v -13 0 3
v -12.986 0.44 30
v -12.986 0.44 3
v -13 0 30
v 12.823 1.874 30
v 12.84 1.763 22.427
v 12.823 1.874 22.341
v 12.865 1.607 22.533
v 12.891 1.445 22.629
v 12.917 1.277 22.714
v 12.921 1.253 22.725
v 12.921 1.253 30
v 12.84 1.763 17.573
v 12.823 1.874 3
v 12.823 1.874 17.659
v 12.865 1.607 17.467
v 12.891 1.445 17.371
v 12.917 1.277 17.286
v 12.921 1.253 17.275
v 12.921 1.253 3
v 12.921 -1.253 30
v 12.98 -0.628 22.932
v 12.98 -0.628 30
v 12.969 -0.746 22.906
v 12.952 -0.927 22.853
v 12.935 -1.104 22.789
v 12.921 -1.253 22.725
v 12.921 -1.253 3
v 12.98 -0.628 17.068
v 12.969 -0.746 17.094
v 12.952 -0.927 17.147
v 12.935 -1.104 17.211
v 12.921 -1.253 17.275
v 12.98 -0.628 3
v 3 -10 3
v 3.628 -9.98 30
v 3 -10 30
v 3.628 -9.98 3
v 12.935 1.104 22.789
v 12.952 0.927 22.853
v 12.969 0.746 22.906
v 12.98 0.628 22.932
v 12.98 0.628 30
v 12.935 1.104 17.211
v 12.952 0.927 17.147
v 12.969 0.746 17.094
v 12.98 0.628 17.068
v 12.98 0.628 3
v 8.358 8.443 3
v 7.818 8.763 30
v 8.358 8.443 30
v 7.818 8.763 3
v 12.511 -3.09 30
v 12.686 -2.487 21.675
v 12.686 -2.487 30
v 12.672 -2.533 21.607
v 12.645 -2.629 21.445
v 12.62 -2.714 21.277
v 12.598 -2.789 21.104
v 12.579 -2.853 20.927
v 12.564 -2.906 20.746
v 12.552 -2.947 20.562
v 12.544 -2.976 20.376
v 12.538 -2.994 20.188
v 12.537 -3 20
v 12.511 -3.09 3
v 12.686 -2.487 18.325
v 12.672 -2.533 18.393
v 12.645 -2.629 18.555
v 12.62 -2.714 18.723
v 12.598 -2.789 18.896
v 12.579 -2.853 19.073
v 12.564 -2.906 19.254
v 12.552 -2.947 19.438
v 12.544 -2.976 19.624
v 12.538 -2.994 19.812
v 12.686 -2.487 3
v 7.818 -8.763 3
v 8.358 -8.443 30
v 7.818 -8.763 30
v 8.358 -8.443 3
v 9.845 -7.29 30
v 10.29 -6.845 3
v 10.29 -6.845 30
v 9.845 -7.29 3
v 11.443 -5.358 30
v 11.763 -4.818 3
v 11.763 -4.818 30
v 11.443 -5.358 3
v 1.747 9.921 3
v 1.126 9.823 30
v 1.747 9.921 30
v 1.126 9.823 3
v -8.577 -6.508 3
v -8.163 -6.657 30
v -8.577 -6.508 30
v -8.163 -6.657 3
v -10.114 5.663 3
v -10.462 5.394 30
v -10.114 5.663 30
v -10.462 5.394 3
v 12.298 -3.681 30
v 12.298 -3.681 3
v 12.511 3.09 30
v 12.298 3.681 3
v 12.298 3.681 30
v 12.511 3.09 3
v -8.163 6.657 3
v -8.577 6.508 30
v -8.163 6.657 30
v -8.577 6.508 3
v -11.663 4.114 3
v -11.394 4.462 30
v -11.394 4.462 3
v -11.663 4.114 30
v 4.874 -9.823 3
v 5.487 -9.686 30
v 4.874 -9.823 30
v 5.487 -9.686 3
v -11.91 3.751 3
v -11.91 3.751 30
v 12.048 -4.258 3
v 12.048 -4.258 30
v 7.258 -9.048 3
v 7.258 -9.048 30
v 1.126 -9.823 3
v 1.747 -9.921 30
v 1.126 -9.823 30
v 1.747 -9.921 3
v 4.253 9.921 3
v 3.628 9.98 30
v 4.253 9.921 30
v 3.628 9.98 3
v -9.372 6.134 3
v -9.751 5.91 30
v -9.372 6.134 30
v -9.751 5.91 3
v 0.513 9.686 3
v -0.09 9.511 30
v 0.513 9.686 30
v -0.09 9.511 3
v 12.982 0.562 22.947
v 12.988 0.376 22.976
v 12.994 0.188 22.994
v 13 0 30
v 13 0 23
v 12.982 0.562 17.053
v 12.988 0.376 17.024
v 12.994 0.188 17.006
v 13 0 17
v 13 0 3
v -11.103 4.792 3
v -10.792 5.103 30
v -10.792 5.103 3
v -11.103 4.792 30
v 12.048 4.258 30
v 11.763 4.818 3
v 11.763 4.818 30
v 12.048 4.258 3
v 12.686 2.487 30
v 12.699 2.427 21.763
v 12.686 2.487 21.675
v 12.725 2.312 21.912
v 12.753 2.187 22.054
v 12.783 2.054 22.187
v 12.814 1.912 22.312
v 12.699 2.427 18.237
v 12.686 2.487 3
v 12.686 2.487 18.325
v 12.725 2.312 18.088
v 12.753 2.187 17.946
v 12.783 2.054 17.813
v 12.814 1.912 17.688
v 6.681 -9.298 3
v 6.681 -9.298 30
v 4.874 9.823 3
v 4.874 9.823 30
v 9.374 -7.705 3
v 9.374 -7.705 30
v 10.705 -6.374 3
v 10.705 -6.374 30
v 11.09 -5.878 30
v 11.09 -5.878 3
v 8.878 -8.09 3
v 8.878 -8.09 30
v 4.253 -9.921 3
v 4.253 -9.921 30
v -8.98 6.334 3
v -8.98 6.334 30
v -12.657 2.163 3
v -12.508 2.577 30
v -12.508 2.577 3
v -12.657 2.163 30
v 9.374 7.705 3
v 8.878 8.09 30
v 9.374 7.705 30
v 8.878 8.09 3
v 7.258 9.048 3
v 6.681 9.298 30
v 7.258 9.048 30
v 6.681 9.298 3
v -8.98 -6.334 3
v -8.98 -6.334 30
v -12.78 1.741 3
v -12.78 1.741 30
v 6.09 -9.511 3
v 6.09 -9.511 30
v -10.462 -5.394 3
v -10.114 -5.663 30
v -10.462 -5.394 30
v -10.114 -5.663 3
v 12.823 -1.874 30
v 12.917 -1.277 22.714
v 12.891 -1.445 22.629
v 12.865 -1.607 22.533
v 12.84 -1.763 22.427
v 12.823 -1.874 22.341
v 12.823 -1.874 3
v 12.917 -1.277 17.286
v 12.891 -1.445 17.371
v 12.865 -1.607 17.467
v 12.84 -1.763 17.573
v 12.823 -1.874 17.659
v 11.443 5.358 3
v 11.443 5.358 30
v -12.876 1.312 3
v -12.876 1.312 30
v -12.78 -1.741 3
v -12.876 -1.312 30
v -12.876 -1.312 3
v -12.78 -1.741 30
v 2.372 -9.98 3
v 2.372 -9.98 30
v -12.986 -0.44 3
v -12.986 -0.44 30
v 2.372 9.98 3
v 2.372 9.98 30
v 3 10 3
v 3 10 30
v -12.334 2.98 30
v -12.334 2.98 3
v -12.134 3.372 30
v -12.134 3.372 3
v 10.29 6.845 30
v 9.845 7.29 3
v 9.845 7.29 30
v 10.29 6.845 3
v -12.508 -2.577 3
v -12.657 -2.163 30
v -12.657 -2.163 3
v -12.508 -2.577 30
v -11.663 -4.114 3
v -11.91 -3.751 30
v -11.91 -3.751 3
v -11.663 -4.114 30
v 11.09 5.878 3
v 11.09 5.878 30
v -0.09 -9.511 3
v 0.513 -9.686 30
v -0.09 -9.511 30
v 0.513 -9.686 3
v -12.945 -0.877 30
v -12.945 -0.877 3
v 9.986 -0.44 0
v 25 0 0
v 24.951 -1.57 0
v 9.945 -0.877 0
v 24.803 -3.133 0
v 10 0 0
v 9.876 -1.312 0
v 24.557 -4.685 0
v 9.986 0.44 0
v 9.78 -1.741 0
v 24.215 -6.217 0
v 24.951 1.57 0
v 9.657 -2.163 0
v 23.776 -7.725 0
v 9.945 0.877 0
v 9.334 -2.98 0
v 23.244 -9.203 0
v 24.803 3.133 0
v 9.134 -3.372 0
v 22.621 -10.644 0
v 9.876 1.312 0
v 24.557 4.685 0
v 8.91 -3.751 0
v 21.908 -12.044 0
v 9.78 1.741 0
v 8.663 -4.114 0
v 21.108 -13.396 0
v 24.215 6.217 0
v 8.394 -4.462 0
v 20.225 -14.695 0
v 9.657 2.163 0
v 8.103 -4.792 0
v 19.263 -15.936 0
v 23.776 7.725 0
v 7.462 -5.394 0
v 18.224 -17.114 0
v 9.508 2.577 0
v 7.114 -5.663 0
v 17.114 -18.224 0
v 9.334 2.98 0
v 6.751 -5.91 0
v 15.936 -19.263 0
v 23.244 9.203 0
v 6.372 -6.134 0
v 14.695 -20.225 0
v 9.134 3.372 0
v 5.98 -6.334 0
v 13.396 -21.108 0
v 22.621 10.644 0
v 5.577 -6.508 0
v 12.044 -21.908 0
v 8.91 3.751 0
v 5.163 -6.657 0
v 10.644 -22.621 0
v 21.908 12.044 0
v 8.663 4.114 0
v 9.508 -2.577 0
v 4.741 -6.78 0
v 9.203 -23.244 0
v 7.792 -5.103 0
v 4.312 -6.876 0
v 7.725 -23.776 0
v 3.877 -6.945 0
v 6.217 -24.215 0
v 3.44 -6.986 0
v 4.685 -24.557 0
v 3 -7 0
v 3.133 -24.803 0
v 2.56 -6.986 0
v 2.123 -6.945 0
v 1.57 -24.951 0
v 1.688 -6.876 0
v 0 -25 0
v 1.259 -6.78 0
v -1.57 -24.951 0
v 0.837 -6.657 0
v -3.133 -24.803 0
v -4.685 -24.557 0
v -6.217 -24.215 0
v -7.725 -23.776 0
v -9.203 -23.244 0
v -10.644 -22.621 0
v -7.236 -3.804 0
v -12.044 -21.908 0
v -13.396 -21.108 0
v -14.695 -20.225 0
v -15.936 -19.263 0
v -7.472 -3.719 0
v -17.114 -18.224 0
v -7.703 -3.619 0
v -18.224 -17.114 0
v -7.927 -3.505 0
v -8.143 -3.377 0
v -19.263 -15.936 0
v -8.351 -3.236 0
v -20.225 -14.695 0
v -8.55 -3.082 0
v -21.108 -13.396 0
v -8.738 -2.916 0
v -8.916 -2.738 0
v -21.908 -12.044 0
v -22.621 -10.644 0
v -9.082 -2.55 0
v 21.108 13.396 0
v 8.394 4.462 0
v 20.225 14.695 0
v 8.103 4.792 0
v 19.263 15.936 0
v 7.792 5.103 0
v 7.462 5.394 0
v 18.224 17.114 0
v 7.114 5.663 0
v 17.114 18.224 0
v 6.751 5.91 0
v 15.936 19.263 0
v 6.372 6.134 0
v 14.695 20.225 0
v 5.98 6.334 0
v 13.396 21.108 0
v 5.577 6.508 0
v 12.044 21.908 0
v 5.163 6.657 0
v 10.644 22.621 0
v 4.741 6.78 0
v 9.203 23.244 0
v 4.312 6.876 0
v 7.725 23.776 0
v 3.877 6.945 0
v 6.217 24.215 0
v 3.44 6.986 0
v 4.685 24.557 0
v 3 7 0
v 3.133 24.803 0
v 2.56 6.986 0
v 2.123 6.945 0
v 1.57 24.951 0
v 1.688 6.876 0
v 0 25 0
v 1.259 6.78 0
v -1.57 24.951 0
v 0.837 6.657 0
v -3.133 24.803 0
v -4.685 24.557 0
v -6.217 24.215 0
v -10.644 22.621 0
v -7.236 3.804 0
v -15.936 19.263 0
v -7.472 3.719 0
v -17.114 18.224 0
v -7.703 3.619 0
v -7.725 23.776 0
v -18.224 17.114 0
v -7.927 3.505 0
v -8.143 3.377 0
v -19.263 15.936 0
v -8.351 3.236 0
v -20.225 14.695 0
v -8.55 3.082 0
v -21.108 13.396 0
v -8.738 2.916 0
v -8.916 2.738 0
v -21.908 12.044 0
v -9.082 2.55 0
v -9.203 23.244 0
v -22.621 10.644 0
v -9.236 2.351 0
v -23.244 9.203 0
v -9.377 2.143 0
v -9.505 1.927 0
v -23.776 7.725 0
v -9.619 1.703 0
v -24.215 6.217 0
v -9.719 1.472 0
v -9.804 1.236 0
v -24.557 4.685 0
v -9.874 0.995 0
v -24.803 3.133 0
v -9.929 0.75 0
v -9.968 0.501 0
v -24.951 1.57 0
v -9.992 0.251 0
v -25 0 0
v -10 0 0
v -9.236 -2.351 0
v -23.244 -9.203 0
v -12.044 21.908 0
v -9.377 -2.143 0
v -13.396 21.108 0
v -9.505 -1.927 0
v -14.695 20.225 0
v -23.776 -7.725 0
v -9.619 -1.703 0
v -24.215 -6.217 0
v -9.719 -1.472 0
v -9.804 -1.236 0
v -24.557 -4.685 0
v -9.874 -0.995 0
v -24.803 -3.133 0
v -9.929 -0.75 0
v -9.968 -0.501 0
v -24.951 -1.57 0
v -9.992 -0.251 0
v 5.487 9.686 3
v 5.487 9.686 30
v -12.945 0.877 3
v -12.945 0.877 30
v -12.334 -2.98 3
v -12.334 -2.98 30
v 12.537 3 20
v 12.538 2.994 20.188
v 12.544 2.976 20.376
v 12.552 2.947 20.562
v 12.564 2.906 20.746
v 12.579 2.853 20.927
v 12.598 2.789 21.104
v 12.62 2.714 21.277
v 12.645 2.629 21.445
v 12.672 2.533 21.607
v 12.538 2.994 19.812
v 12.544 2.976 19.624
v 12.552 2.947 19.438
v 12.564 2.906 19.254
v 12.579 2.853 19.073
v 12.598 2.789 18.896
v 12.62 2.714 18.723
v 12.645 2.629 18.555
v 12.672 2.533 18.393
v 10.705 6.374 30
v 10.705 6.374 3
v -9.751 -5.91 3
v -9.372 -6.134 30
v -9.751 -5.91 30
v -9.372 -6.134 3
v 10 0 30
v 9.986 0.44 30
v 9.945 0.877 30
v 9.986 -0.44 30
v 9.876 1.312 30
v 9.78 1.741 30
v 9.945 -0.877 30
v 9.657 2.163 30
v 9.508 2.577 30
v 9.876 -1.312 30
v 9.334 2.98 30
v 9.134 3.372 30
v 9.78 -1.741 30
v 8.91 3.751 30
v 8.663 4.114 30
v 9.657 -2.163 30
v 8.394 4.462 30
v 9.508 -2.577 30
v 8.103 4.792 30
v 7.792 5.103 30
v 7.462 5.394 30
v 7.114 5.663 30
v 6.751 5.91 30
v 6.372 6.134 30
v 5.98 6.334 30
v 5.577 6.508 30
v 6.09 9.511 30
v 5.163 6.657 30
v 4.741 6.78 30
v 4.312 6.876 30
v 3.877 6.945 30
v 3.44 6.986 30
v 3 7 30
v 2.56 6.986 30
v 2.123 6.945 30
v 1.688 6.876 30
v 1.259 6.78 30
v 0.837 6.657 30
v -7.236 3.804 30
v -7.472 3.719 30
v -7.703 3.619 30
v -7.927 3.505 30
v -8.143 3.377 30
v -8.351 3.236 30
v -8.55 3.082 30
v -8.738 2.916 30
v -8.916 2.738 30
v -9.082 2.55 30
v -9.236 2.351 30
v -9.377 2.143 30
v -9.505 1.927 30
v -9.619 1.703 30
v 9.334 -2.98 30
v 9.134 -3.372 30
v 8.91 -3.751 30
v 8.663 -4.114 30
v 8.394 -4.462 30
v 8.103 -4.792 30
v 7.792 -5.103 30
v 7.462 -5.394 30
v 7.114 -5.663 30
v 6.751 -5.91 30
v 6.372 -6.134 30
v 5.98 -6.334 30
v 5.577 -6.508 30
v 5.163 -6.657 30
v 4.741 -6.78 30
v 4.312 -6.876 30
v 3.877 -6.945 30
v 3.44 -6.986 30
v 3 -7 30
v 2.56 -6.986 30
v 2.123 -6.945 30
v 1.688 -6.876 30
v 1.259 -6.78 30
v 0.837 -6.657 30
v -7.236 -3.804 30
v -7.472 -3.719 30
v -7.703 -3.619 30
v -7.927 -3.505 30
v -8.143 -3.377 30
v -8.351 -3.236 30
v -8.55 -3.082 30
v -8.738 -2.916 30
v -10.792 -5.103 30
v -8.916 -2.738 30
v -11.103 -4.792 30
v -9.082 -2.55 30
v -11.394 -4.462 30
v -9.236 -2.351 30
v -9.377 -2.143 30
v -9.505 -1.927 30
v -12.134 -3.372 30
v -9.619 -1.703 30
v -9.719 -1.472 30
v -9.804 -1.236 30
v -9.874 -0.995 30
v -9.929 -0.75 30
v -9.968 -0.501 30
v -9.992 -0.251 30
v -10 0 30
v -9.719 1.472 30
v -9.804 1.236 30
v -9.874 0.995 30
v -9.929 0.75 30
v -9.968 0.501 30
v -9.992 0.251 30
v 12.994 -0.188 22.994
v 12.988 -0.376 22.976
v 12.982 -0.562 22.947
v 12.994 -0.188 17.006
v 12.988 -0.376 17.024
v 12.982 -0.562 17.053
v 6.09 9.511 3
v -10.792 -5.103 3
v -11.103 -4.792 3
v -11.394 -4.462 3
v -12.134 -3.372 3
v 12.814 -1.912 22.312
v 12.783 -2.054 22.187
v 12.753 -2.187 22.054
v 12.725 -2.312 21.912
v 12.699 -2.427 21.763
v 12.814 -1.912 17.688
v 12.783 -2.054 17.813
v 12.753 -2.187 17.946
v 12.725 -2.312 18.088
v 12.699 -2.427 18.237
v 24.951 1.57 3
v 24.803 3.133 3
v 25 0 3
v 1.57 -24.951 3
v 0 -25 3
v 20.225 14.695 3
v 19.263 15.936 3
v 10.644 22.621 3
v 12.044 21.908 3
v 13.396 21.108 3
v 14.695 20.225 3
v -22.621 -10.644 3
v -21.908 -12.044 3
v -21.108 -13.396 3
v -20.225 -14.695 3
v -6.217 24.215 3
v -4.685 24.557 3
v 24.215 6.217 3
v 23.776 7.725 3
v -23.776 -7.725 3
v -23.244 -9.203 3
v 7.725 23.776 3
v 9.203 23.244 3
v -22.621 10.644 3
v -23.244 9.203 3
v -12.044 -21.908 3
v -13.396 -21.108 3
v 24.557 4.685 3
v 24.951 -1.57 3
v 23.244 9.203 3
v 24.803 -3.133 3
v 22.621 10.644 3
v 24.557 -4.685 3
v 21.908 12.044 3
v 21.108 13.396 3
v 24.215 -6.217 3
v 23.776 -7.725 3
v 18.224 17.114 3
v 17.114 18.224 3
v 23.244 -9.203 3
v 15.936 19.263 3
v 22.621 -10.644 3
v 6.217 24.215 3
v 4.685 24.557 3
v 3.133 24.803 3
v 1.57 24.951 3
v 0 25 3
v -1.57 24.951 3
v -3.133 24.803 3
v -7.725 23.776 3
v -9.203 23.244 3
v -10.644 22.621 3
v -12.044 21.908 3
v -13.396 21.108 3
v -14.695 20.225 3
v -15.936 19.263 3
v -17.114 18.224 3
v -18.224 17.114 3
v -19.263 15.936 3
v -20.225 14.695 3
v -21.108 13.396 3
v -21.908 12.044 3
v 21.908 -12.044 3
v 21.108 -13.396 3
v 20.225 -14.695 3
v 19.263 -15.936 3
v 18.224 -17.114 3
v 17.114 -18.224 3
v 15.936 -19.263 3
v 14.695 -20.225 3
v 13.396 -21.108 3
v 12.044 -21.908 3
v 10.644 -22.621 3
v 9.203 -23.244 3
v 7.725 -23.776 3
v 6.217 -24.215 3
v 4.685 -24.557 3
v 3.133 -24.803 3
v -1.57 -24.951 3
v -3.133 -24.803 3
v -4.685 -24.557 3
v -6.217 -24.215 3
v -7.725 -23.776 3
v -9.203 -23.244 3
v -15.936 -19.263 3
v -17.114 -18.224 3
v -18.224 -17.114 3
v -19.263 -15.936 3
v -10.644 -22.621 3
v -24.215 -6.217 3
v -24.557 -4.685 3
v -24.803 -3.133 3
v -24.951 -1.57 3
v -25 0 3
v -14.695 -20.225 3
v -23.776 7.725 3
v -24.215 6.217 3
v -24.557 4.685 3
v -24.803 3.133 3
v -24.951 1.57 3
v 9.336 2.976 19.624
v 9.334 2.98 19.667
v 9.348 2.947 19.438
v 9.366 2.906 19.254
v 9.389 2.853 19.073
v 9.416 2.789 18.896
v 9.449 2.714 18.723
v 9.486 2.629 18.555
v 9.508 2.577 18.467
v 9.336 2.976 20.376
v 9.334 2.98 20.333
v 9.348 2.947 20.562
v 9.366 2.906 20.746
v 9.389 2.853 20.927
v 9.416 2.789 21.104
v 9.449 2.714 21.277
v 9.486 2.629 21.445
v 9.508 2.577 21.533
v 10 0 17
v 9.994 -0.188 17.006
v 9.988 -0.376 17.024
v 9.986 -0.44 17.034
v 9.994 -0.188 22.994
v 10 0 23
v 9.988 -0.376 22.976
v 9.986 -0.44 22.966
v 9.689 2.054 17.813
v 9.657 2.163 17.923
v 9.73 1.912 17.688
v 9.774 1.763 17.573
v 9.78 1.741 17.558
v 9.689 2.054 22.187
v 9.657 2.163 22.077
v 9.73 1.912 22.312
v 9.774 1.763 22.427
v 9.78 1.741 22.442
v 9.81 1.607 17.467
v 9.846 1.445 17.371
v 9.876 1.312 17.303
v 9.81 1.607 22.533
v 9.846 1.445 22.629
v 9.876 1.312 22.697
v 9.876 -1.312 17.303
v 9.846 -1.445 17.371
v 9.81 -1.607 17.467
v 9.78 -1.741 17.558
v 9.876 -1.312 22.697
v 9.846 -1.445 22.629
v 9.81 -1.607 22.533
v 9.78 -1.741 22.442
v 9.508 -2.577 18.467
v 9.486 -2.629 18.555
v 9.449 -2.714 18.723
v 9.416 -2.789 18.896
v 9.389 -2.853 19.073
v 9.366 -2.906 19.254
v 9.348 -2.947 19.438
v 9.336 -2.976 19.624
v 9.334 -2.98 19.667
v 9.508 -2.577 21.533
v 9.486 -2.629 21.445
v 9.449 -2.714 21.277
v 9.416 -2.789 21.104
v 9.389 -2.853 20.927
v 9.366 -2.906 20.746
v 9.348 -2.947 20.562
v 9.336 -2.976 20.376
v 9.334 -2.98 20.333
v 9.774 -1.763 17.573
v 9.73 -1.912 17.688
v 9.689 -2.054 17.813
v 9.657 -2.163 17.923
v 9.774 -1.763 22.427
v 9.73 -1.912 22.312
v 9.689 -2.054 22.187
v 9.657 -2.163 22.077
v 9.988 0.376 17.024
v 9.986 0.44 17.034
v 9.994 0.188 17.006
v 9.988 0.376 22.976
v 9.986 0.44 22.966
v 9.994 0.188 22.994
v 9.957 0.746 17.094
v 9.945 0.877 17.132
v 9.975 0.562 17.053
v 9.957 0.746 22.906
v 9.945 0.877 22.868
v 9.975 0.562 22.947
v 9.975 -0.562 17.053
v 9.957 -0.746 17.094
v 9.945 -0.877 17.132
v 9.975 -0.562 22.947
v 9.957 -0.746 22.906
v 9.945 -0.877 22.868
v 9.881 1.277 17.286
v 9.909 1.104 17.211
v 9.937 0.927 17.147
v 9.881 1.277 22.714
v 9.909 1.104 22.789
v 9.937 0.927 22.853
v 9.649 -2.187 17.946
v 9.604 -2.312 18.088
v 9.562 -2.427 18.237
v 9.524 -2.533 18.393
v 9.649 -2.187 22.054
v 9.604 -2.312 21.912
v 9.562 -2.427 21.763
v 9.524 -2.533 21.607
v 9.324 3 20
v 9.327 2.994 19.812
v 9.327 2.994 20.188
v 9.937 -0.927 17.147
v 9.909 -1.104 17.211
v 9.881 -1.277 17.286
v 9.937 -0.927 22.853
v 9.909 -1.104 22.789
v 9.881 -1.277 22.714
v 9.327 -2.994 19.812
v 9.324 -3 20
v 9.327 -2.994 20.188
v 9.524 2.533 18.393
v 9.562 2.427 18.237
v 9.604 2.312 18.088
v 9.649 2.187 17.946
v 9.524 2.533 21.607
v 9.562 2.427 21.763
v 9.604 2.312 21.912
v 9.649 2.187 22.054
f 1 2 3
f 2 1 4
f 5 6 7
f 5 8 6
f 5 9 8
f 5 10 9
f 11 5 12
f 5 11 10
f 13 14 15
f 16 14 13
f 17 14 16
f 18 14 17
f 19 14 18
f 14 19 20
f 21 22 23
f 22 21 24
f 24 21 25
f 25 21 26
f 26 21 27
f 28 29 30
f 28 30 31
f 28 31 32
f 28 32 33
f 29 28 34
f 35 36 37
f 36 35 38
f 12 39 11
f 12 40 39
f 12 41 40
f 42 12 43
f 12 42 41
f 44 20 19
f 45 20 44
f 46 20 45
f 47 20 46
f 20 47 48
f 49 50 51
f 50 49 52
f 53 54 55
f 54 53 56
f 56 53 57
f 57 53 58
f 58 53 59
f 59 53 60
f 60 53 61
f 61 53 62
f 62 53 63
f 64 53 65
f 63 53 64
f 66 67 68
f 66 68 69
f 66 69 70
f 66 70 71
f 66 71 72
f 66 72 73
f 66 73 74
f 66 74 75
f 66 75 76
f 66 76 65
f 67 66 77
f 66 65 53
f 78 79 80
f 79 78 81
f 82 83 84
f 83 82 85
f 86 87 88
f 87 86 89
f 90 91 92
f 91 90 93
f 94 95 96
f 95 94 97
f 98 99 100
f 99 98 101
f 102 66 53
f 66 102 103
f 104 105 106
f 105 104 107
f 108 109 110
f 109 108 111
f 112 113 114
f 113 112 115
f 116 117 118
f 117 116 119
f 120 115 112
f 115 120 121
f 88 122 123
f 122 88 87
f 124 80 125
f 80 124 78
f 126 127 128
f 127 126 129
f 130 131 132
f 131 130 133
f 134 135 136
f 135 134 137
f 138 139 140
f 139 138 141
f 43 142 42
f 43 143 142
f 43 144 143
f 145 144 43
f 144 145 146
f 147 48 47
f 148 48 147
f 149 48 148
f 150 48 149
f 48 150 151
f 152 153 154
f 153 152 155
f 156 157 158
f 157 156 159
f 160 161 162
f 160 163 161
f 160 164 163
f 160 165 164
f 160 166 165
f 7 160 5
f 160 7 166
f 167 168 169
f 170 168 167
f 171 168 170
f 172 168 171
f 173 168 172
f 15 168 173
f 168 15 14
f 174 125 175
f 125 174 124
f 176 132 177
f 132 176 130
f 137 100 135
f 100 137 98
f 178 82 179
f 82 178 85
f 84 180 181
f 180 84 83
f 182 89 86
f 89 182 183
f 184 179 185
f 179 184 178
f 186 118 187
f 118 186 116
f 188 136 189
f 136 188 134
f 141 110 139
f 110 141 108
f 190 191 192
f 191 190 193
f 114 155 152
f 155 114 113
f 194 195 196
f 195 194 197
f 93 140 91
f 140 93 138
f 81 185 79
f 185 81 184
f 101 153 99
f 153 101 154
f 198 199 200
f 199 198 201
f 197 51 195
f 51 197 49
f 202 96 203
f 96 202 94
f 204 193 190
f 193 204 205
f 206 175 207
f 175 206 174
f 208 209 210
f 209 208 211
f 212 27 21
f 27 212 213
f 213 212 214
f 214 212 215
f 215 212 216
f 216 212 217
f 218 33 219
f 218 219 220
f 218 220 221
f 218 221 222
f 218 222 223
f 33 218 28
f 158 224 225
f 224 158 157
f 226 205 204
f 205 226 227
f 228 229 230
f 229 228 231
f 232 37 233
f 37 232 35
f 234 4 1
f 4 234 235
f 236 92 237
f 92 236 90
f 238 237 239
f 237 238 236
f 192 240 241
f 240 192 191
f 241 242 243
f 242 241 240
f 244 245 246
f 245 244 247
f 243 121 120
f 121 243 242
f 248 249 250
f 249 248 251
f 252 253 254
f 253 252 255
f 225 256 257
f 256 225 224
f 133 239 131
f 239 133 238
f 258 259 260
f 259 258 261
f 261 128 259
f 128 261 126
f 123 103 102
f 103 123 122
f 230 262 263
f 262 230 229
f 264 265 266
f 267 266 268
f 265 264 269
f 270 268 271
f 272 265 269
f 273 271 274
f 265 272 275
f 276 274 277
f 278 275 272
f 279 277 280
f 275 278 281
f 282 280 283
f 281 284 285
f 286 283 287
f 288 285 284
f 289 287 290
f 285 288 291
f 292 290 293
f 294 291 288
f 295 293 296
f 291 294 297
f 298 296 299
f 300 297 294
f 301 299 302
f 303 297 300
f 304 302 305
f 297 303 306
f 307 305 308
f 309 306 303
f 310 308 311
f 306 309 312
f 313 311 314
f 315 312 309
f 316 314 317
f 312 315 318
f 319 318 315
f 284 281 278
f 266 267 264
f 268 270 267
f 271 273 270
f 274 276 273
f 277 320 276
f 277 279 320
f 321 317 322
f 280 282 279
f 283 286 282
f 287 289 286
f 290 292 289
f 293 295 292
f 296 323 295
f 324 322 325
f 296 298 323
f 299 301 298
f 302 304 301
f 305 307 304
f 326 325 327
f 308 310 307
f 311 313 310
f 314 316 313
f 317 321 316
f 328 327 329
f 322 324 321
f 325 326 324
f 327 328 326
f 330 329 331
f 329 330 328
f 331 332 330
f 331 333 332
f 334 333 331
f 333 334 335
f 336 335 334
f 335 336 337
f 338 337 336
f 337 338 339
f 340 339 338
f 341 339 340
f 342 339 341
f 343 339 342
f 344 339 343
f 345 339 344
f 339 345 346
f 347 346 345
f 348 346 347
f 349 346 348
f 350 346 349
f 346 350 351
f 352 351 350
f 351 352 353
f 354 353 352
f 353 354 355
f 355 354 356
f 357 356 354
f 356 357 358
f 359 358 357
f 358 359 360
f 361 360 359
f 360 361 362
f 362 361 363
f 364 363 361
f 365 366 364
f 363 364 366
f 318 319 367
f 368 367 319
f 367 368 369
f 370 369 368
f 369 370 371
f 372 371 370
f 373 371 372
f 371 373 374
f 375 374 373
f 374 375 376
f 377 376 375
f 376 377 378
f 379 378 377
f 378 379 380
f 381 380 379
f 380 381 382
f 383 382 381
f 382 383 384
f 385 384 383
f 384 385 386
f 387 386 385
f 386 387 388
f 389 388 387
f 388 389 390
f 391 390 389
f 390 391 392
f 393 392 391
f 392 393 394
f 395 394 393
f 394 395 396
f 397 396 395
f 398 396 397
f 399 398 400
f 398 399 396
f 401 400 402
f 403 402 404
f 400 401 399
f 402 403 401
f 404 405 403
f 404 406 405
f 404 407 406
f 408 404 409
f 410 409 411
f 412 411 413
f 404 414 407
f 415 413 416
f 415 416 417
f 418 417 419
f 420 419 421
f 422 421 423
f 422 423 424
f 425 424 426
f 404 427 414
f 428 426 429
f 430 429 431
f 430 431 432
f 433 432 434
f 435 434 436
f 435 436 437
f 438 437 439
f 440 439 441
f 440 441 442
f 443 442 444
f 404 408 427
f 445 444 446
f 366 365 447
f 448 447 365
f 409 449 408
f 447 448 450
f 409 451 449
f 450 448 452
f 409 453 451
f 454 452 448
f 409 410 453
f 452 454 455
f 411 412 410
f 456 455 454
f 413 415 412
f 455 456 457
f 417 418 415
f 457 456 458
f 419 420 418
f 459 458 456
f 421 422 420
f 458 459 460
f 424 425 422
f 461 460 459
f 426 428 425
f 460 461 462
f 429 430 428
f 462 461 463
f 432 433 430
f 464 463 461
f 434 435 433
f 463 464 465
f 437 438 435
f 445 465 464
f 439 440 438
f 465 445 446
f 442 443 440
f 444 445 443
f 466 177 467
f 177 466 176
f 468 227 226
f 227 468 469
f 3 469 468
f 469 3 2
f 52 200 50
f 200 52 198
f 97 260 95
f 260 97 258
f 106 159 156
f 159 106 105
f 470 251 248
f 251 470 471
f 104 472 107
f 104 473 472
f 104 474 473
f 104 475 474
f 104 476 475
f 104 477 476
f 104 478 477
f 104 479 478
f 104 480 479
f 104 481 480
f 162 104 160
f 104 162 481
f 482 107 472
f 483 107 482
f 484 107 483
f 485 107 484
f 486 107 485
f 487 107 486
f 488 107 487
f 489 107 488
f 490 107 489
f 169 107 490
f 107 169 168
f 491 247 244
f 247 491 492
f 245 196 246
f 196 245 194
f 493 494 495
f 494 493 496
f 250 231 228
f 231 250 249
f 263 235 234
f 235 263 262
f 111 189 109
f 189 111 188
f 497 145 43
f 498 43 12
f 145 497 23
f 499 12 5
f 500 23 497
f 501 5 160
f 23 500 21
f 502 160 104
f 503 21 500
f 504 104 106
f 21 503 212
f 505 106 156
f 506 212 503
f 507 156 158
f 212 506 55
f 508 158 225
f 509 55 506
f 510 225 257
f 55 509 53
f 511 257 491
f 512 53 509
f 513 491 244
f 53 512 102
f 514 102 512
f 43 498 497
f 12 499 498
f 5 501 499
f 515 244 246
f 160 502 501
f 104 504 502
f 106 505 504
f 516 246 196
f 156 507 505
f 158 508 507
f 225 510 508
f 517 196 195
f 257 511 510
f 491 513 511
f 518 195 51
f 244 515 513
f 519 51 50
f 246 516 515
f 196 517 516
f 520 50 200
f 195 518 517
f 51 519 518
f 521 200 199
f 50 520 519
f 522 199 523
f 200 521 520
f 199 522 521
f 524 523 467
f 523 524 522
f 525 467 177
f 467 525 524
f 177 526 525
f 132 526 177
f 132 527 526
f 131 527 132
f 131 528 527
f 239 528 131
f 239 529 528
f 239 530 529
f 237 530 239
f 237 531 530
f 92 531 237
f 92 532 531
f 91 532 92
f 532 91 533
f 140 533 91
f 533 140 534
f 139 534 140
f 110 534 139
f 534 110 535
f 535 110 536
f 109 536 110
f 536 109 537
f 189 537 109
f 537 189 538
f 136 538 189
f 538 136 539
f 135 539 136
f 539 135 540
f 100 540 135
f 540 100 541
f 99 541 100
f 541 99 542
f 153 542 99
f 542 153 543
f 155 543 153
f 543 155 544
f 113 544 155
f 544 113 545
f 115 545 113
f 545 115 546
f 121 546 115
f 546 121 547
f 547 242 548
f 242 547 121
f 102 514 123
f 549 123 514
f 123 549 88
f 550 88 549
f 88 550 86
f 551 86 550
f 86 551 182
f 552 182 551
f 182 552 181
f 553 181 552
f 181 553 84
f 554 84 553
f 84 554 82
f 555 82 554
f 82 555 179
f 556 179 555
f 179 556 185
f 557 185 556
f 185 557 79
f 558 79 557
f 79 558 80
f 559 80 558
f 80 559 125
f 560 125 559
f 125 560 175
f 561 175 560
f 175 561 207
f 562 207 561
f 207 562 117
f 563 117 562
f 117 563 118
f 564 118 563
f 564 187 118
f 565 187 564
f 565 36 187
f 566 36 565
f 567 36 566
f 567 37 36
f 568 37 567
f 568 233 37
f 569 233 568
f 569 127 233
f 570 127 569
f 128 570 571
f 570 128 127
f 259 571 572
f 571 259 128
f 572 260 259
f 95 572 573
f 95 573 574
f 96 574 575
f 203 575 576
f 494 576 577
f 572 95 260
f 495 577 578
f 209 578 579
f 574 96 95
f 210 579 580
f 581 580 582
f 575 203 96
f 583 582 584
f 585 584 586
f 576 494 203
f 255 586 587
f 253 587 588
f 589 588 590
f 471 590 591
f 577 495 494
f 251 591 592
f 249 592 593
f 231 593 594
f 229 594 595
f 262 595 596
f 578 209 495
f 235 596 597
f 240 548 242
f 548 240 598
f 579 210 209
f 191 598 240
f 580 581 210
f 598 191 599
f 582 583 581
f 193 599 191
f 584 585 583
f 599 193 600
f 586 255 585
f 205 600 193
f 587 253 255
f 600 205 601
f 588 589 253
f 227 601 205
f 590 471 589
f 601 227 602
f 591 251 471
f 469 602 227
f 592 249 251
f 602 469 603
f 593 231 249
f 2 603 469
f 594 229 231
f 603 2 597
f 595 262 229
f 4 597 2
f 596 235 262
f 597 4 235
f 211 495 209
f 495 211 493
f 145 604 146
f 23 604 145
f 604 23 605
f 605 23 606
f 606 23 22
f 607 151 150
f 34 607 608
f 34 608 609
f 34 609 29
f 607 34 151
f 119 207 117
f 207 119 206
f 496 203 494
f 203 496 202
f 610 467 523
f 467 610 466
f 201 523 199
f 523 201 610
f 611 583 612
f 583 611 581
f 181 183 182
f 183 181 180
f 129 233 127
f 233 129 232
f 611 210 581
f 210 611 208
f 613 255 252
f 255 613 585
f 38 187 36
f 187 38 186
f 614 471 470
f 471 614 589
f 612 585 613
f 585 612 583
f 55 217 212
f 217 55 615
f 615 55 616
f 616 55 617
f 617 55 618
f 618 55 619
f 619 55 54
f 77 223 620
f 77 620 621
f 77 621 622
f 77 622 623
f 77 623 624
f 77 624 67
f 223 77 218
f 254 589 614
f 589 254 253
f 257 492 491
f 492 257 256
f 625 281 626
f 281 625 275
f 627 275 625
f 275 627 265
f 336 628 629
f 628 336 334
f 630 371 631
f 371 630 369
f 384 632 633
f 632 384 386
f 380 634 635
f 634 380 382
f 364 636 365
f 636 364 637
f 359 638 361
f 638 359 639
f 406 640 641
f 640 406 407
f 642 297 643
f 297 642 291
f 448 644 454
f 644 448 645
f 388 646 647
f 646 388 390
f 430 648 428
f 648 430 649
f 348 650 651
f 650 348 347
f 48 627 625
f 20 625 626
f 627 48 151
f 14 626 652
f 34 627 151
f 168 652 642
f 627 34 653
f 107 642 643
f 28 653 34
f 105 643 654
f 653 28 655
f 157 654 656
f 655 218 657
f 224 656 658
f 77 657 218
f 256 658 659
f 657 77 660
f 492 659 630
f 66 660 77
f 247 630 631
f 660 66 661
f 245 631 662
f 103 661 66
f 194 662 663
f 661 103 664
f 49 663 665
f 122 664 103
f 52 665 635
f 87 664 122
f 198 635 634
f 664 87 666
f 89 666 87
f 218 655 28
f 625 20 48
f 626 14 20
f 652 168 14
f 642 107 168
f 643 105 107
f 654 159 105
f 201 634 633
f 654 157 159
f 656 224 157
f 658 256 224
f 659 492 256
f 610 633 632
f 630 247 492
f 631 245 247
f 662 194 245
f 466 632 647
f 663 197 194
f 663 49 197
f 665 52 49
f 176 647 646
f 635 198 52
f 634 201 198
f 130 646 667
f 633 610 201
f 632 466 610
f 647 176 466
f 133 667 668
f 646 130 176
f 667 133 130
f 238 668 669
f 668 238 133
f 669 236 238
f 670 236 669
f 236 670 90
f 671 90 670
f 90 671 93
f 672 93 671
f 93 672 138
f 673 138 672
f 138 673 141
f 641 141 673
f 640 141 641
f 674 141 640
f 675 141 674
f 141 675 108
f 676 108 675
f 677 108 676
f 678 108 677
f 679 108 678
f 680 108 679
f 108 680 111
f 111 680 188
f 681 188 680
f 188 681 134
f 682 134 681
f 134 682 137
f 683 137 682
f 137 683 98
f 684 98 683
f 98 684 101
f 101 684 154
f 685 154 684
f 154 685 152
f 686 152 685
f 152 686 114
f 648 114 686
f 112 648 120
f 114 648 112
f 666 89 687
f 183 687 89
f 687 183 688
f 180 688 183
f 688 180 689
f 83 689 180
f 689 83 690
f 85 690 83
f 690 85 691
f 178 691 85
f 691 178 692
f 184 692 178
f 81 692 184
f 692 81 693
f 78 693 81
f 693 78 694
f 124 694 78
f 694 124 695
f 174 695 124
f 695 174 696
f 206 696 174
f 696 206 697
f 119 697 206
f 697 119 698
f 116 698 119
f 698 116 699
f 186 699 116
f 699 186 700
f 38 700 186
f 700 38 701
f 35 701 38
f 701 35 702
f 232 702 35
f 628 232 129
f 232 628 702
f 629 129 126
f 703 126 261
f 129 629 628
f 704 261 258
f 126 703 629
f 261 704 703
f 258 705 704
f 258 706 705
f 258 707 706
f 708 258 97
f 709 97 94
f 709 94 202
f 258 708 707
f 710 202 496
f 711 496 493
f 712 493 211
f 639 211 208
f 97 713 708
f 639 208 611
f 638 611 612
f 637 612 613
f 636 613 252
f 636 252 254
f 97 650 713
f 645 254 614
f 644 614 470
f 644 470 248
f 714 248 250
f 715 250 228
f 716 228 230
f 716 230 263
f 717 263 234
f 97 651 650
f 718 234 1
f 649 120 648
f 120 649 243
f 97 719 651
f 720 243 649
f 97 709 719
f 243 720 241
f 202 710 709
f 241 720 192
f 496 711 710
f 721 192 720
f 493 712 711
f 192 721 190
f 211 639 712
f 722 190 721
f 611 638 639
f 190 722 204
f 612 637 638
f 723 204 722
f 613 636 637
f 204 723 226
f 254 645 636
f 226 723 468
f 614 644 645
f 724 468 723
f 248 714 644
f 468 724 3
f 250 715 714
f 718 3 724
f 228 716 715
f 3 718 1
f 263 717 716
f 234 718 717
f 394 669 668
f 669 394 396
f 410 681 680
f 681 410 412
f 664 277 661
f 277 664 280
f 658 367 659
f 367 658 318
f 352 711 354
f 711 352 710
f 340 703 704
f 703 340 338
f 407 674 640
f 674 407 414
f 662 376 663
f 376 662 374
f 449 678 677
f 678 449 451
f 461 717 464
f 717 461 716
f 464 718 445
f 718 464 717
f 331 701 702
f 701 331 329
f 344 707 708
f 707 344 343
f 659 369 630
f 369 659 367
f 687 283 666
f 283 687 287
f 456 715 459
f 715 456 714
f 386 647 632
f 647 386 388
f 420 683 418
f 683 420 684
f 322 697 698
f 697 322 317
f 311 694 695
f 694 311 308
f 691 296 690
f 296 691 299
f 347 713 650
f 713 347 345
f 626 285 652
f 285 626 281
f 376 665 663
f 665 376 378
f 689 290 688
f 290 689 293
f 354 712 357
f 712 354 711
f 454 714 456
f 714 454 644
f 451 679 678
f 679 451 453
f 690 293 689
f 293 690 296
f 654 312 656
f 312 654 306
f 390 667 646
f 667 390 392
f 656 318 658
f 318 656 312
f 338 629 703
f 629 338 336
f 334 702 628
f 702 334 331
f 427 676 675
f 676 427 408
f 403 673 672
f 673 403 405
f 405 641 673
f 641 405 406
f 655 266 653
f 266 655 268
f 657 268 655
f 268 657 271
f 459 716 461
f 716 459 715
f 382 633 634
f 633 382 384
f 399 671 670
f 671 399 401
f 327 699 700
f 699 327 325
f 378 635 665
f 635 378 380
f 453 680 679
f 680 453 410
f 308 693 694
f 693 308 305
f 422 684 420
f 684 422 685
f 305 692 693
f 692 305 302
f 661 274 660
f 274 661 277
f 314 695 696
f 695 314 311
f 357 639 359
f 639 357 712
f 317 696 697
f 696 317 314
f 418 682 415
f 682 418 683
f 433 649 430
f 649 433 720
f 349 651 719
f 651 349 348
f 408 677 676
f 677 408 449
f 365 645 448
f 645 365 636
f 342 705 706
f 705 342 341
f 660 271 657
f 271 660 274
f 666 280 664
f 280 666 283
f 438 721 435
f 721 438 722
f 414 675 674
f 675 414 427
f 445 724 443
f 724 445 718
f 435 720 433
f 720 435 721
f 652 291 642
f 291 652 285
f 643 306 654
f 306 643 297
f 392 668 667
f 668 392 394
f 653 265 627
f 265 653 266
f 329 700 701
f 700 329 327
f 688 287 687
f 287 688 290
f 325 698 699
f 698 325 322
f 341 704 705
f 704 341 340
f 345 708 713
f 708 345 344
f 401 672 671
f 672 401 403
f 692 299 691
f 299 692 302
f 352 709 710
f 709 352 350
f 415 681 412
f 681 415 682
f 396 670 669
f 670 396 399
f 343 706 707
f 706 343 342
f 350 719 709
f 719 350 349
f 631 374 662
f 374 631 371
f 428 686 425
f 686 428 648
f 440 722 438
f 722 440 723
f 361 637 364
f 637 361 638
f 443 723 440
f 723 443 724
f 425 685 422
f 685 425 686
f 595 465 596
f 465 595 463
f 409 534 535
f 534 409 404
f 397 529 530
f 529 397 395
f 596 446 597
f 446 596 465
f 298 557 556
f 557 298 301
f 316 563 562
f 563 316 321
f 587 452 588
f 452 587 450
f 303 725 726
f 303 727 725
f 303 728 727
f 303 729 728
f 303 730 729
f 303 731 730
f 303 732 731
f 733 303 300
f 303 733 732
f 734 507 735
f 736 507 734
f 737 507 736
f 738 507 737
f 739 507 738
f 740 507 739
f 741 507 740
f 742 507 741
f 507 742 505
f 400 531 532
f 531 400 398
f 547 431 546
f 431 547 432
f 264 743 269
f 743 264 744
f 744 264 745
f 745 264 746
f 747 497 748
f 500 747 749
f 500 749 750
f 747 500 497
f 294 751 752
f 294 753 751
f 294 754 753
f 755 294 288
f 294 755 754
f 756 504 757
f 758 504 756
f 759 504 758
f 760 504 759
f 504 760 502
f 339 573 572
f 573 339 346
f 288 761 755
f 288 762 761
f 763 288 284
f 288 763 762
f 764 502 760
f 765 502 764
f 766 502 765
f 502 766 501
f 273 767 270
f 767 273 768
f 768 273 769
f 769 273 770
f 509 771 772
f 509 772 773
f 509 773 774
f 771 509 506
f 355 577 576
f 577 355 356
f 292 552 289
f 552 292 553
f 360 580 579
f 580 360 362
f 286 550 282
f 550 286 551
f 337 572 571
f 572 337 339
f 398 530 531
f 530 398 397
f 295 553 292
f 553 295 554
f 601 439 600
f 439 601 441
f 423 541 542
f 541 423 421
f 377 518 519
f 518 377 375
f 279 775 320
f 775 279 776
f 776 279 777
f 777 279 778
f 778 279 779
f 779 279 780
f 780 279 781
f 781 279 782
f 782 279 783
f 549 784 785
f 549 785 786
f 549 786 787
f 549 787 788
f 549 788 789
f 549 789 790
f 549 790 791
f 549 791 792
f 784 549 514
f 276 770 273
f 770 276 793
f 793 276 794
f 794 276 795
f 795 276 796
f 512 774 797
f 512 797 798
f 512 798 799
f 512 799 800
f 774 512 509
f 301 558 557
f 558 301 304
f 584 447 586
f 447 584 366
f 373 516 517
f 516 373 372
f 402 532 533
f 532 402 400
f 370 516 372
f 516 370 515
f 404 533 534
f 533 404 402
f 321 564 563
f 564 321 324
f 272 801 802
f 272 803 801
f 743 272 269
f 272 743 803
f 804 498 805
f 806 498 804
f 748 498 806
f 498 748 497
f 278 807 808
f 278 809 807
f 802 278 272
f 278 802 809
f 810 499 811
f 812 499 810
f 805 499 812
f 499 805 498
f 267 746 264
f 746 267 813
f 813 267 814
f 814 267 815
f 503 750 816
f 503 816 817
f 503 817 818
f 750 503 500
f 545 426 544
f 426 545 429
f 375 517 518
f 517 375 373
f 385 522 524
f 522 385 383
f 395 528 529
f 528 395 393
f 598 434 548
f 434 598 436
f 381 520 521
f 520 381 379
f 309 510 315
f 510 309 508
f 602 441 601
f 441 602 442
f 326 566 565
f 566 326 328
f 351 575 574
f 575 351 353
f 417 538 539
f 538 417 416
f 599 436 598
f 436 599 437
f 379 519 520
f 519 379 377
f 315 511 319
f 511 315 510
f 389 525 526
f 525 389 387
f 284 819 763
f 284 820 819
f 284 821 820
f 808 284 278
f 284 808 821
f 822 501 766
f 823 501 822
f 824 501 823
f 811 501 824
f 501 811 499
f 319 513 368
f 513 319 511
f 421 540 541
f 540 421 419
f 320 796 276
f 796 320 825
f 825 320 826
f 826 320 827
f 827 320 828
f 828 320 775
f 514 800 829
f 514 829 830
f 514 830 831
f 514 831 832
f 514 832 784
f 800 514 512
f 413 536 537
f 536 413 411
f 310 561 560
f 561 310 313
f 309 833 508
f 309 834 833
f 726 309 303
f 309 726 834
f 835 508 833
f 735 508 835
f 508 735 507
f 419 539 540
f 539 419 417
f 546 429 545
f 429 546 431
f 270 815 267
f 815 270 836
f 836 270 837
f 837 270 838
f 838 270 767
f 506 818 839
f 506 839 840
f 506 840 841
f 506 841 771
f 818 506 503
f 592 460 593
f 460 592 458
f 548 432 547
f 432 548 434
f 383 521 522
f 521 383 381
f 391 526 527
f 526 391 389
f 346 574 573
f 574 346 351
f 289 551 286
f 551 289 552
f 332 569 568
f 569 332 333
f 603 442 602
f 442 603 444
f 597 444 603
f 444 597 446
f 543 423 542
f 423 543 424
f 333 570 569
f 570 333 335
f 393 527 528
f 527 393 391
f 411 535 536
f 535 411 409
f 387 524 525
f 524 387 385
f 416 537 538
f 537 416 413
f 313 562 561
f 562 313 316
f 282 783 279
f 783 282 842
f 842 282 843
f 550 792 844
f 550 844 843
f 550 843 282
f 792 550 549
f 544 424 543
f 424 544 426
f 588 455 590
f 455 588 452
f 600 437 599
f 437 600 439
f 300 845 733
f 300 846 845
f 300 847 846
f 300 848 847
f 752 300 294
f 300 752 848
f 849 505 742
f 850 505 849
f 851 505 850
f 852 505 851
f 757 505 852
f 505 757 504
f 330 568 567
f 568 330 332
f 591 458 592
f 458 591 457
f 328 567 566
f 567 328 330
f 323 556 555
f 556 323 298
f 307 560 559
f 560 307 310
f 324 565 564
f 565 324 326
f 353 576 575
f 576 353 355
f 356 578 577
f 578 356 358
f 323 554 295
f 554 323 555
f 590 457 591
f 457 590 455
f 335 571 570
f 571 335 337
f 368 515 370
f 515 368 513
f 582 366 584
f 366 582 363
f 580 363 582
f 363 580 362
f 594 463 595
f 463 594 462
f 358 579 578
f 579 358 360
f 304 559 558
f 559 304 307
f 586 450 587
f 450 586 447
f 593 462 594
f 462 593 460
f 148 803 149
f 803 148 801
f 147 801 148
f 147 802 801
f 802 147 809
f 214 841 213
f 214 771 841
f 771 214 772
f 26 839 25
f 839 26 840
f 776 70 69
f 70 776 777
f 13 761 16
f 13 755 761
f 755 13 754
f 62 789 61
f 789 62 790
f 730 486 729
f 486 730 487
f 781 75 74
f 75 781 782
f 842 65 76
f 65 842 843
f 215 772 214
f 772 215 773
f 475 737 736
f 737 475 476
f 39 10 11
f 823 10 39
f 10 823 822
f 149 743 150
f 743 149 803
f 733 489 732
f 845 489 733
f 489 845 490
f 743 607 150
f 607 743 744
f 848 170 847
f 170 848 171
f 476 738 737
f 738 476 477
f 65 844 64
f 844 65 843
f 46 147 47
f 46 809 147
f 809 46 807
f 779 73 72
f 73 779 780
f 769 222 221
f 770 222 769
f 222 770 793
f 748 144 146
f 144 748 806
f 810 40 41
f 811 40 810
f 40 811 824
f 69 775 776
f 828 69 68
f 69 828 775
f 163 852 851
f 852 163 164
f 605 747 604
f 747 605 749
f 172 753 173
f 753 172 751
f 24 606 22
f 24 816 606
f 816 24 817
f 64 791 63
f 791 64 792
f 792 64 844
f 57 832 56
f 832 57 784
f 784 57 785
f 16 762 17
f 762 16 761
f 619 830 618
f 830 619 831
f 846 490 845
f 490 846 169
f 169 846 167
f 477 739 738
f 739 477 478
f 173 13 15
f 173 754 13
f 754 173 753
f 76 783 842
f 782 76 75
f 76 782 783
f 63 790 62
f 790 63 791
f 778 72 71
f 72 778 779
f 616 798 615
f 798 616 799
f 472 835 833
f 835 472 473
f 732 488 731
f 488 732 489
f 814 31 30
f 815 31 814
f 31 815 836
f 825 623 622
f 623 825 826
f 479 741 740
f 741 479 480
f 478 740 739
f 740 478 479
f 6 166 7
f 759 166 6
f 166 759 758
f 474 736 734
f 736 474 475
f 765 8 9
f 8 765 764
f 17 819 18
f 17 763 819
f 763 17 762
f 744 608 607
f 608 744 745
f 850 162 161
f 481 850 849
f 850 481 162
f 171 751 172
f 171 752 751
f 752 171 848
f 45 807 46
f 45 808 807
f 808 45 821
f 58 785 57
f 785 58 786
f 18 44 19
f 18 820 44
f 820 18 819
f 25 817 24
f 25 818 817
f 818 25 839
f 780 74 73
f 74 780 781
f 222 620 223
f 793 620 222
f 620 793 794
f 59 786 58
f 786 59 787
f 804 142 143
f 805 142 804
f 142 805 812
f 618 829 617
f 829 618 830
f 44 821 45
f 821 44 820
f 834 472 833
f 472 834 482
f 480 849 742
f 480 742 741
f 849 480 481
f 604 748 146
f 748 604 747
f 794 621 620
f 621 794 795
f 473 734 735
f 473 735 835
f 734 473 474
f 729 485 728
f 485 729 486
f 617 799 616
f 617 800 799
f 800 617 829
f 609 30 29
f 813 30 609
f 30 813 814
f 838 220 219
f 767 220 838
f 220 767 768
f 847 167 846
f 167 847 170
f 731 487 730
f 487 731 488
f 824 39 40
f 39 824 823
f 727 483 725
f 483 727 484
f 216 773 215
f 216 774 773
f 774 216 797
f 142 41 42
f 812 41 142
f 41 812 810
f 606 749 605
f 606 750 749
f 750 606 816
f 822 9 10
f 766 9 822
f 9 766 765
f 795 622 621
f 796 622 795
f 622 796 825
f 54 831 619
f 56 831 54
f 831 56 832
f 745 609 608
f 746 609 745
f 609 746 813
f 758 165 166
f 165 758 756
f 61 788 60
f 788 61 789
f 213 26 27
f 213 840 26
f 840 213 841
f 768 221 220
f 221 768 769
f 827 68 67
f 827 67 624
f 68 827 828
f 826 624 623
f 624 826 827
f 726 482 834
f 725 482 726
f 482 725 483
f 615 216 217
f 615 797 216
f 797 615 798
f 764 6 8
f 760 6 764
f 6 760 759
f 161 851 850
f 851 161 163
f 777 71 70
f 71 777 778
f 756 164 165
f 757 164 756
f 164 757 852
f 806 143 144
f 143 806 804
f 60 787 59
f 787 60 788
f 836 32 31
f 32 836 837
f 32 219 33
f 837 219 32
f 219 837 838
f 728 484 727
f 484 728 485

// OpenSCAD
pen_radius = 5.6;

module cd_hole(){
    cylinder(r=10,h=10,center=true);
}

module pen(){
    cylinder(r=5.6,h=100, center=true);
}

module cd(){
    translate([0,0,-.5])
    difference(){
        cylinder(r=59,h=1,center=true);
        cd_hole();
    }
}

module base(){
    cylinder(r=20,h=3,center=true);
}

module small_cutout(){
    
}

*cd();
*pen();
*translate([0,0,2]){
    base();
}


$fn=100;
cd_hole_rad = 10;
small_rad = 4;
large_rad= 7;
hole_rad = cd_hole_rad;
base_height = 3;
shaft_thickness=3;
shaft_height = 30;
grub_hole_size = 3;

module tear(small_rad,large_rad,hole_rad,base_height,center=false){

up = hole_rad - large_rad;
down = -hole_rad + small_rad;

linear_extrude(height = base_height,center=center){
hull(){
translate([up,0,0])  circle(r=large_rad);
//polygon(points=[[up,-large_rad],[up,large_rad],[down,small_rad],[down,-small_rad]]);
translate([down,0,0]) circle(r=small_rad);
}
}
}

base_rad = 25;
base_height = 3;

module grub_hole(){
translate([hole_rad,0,shaft_height*2/3])
rotate([0,90,0])
cylinder(h=shaft_thickness*3,r=grub_hole_size,center=true);
}


difference(){
    union(){
    
    tear(small_rad+shaft_thickness,large_rad+shaft_thickness,hole_rad+shaft_thickness,shaft_height);
    cylinder(r=base_rad,h=base_height);    
    }
    translate([0,0,-.5])
    tear(small_rad,large_rad,hole_rad,shaft_height+1);
    grub_hole();
}
